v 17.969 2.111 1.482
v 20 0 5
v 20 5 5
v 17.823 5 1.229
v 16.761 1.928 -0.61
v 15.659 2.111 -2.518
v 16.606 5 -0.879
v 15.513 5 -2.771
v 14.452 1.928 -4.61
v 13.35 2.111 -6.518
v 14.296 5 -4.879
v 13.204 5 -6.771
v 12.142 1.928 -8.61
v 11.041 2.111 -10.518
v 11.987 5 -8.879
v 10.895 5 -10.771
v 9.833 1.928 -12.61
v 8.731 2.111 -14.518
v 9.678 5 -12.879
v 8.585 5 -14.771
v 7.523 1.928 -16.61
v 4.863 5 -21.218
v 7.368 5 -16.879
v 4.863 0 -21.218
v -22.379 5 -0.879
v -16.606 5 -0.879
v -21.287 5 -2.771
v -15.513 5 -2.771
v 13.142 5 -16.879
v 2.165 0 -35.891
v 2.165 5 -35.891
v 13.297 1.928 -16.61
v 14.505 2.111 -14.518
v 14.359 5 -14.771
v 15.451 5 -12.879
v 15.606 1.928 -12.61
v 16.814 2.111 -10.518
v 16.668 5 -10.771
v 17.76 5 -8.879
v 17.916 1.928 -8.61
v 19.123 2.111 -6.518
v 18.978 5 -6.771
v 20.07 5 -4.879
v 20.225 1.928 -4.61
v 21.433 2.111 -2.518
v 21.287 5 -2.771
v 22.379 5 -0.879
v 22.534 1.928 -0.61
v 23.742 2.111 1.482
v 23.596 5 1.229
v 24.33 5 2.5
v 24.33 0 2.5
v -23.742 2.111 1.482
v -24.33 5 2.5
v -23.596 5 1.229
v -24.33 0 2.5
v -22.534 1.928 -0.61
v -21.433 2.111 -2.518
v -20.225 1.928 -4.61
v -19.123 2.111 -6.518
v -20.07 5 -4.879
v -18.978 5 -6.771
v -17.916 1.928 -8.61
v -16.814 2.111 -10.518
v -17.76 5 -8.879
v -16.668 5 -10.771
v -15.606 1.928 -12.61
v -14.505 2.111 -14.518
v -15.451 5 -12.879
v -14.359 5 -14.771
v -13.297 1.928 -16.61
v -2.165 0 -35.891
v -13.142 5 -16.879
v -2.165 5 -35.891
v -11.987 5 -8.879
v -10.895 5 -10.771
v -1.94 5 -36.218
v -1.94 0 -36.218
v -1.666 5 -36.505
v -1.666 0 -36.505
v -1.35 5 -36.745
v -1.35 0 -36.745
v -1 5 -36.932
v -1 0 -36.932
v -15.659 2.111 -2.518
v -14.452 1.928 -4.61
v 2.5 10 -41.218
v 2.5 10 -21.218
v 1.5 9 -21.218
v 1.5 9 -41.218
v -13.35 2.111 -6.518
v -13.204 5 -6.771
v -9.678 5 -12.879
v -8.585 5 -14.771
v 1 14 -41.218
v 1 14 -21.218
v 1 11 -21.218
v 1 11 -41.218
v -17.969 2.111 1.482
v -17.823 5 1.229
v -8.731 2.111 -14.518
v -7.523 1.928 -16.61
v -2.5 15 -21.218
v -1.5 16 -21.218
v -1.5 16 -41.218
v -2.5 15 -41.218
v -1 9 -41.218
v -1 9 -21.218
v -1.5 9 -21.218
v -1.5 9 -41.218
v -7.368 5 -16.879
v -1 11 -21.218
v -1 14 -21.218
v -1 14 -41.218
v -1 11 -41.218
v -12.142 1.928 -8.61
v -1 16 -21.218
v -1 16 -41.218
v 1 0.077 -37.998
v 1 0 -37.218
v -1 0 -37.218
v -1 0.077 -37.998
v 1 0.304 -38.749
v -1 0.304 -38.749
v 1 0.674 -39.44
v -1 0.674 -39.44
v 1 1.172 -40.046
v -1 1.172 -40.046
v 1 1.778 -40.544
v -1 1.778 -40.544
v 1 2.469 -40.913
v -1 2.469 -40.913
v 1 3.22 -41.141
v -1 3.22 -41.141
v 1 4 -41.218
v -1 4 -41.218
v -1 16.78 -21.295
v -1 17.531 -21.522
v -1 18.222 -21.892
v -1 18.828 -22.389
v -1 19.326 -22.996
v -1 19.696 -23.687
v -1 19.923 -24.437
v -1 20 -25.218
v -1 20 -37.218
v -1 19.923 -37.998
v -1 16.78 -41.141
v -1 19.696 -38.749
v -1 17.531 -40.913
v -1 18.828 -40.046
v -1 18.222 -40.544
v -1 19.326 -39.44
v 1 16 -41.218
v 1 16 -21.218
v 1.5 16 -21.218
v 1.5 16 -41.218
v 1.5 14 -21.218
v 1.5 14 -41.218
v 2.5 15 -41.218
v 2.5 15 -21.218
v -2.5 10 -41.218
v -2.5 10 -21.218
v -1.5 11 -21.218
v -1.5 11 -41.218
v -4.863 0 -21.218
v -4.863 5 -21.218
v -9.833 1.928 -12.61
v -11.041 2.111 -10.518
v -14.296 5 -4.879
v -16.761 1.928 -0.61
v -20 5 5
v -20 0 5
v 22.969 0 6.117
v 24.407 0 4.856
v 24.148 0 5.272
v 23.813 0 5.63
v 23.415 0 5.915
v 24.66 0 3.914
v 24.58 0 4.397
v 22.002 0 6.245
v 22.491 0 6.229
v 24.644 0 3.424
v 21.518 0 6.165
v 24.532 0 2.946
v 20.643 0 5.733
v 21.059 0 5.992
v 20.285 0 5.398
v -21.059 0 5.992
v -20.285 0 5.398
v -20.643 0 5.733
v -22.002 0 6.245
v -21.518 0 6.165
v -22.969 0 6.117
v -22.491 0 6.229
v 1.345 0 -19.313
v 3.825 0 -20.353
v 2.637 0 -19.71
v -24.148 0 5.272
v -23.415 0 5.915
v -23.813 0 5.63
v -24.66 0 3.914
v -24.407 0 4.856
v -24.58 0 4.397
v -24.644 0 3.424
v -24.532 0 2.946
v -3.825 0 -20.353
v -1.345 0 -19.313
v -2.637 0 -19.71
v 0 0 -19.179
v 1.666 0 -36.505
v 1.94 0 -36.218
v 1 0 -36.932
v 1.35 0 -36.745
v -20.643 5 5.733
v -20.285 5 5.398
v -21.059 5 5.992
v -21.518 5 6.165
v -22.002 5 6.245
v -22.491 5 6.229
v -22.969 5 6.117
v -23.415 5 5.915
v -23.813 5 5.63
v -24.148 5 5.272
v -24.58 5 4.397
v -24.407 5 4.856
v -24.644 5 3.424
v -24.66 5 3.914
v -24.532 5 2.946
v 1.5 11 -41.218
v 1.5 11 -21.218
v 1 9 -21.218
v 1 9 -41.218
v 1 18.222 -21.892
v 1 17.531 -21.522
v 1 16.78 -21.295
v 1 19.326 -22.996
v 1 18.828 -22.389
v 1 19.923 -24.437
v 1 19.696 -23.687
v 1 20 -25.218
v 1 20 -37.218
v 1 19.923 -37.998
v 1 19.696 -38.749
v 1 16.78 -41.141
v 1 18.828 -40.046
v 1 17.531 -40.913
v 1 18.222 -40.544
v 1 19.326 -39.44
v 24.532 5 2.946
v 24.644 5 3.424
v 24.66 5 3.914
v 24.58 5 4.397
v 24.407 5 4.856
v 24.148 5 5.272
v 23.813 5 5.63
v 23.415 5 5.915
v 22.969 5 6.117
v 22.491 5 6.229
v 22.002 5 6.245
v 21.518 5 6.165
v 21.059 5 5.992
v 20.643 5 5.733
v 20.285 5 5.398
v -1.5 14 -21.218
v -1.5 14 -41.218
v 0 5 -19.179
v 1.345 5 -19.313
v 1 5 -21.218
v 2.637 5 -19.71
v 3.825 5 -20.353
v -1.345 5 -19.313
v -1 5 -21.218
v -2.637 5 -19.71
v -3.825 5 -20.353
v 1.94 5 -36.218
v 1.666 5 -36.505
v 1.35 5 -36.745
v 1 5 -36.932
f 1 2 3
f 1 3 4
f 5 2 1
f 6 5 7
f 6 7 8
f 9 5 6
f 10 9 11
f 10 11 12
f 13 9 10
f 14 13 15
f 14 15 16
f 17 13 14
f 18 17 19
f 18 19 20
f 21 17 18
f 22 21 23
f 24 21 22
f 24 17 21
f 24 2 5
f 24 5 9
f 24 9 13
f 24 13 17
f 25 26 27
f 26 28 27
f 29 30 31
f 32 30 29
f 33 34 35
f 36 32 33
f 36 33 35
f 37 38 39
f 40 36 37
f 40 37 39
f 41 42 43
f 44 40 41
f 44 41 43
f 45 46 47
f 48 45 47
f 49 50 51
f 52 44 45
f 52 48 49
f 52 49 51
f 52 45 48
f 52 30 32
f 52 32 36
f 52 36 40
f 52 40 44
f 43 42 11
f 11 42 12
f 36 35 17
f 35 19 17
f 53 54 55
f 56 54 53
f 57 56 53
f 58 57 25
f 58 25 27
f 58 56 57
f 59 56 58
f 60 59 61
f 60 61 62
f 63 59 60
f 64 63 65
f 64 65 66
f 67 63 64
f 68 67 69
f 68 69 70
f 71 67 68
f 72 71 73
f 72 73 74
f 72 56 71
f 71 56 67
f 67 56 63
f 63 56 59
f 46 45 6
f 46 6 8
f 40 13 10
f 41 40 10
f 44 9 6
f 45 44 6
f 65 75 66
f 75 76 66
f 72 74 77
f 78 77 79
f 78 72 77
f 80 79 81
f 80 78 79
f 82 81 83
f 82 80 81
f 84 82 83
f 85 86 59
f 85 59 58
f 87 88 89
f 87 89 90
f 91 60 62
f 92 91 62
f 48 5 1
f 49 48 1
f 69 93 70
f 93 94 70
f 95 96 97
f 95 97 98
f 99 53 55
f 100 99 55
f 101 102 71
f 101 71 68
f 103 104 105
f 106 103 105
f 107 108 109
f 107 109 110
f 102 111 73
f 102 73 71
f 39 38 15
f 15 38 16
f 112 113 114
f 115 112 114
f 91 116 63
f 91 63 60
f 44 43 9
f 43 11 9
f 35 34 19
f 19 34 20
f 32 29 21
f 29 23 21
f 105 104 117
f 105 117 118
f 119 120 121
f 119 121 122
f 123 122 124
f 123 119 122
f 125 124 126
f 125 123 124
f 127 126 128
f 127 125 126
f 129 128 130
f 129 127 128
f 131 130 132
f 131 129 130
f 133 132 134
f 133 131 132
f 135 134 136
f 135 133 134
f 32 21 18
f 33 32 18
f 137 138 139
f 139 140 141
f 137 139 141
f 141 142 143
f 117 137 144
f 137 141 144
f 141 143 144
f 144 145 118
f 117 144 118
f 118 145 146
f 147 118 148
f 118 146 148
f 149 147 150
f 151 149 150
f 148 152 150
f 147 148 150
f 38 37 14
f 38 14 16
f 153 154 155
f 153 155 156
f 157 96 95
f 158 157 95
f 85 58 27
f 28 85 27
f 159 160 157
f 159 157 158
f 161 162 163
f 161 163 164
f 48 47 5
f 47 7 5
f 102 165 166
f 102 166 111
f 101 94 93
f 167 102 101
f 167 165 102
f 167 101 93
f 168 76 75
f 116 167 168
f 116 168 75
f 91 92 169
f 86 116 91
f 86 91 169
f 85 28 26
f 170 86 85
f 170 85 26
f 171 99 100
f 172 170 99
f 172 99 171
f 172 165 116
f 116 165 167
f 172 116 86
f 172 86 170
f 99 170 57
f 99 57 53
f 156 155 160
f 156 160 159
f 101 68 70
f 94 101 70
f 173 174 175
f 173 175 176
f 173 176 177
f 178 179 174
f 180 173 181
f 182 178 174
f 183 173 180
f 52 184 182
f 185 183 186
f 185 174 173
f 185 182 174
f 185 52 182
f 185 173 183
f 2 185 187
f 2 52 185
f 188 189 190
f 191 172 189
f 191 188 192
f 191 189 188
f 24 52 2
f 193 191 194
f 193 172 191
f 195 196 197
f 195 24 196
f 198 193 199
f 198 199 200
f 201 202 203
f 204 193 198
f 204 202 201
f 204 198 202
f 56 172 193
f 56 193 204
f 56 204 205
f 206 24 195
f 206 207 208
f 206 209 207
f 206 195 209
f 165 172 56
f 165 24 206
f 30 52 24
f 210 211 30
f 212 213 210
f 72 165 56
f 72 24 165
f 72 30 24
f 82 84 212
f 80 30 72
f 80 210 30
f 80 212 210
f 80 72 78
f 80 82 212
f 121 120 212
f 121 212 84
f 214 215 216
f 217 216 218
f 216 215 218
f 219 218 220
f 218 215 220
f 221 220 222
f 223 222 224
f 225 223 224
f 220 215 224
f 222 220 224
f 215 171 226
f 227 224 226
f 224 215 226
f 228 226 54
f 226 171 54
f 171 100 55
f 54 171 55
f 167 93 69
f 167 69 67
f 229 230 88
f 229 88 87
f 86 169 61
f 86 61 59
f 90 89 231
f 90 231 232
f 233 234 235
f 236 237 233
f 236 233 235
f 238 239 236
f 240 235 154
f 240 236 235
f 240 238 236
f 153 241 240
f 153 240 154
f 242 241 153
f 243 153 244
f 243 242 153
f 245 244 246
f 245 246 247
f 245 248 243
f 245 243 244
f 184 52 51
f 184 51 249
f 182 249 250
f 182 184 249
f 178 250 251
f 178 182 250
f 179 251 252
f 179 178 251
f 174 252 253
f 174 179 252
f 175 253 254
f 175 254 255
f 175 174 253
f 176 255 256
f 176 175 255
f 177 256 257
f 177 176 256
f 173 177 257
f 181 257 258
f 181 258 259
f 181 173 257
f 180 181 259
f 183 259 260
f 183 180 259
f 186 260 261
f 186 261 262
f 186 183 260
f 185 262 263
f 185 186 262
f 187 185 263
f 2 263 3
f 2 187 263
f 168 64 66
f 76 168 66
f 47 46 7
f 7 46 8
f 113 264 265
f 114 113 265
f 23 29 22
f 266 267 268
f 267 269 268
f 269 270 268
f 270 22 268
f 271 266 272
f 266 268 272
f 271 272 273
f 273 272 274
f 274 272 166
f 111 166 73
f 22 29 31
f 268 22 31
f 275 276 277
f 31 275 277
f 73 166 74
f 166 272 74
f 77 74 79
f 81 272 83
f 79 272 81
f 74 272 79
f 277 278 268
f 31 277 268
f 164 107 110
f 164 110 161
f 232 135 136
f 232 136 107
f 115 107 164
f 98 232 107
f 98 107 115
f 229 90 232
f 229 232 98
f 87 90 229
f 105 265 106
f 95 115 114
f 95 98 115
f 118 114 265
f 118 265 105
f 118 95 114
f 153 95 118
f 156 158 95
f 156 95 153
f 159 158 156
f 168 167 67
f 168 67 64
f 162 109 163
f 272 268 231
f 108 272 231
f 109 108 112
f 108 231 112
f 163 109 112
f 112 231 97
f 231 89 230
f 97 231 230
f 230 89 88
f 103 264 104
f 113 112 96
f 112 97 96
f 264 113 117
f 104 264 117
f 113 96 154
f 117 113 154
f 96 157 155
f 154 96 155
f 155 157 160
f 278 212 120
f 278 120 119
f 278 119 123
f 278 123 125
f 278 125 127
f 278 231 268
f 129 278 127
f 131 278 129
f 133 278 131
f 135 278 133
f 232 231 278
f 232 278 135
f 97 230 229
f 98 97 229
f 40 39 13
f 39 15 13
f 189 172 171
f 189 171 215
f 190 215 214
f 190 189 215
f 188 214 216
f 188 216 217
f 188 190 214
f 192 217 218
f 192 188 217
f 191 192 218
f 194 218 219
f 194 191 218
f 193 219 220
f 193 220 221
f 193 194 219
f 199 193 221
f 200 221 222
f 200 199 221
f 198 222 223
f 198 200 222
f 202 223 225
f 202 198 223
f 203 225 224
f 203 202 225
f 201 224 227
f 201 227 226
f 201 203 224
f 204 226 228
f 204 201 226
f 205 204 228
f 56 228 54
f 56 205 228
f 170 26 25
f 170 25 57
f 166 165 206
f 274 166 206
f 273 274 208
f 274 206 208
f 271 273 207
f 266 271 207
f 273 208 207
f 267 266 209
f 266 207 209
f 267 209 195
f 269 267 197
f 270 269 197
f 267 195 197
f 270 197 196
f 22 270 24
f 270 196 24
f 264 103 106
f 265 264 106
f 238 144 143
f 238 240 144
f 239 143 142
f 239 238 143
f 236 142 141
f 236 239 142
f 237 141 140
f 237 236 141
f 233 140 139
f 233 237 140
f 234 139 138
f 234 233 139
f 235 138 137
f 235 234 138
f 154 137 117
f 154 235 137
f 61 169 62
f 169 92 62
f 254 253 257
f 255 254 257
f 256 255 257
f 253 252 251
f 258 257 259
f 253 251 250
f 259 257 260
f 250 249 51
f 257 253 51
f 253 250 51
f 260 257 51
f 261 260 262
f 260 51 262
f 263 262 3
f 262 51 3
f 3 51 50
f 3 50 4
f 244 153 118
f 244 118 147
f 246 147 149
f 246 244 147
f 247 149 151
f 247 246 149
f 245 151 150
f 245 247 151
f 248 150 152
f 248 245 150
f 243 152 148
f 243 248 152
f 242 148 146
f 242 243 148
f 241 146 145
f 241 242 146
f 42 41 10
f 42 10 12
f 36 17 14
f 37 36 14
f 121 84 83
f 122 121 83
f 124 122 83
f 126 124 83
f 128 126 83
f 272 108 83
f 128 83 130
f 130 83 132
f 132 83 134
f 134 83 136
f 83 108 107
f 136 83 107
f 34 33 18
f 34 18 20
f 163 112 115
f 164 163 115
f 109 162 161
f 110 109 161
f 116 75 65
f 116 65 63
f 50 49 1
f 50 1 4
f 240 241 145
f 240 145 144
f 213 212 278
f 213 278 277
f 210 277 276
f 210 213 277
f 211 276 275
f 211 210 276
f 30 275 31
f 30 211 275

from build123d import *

# Parameters (mm, degrees)
BASE_DEPTH           = 5
BOARDSLOT_DEPTH      = 45.86446744
BOARDSLOT_DEPTH_BACK = 45.86446744
SUPPORTMOUNT_DEPTH   = 5
BOSS_EXTRUDE1_DEPTH  = 1
SKETCH10_W           = 20
SKETCH10_H           = 2
BOSS_EXTRUDE2_DEPTH  = 2.5
CHAMFER1_SIZE        = 1


with BuildPart() as part:
    # Sketch1 → Base (new body)
    with BuildSketch(Plane(origin=(0, 0, 0), x_dir=(1, 0, 0), z_dir=(0, 1, 0))):
        with BuildLine():
            Line((-24.330127019, -2.5), (-2.165063509, 35.891016151))
            ThreePointArc((-2.165063509, 35.891016151), (0, 37.141016151), (2.165063509, 35.891016151))
            Line((2.165063509, 35.891016151), (24.330127019, -2.5))
            ThreePointArc((24.330127019, -2.5), (23.415063509, -5.915063509), (20, -5))
            Line((20, -5), (2.165063509, 25.891016151))
            ThreePointArc((2.165063509, 25.891016151), (0, 27.141016151), (-2.165063509, 25.891016151))
            Line((-2.165063509, 25.891016151), (-20, -5))
            ThreePointArc((-20, -5), (-23.415063509, -5.915063509), (-24.330127019, -2.5))
        make_face()
    extrude(amount=BASE_DEPTH)

    # Sketch2 → BoardSlot (cut, two sides: drawn at the far end of the back side and taken through both)
    with BuildSketch(Plane(origin=(0, 0, 0), x_dir=(0, 0, -1), z_dir=(1, 0, 0)).offset(-BOARDSLOT_DEPTH_BACK)):
        Polygon((-1.481783147, 2.110540039), (-0.610225719, 12.07248702), (1.481783147, 11.889459961), (0.610225719, 1.92751298), align=None)
        Polygon((3.389774281, 12.07248702), (5.481783147, 11.889459961), (4.610225719, 1.92751298), (2.518216853, 2.110540039), align=None)
        Polygon((7.389774281, 12.07248702), (9.481783147, 11.889459961), (8.610225719, 1.92751298), (6.518216853, 2.110540039), align=None)
        Polygon((11.389774281, 12.07248702), (13.481783147, 11.889459961), (12.610225719, 1.92751298), (10.518216853, 2.110540039), align=None)
        Polygon((15.389774281, 12.07248702), (17.481783147, 11.889459961), (16.610225719, 1.92751298), (14.518216853, 2.110540039), align=None)
    extrude(amount=BOARDSLOT_DEPTH + BOARDSLOT_DEPTH_BACK, mode=Mode.SUBTRACT)

    # Sketch3 → SupportMount (add)
    with BuildSketch(Plane(origin=(0, 0, 0), x_dir=(1, 0, 0), z_dir=(0, 1, 0))):
        with BuildLine():
            Line((5.906733437, 29.410253733), (2.165063509, 35.891016151))
            ThreePointArc((2.165063509, 35.891016151), (0, 37.141016151), (-2.165063509, 35.891016151))
            Line((-2.165063509, 35.891016151), (-5.906733437, 29.410253733))
            ThreePointArc((-5.906733437, 29.410253733), (0, 19.179491924), (5.906733437, 29.410253733))
        make_face()
    extrude(amount=SUPPORTMOUNT_DEPTH)

    # Sketch9 → Boss-Extrude1 (add, symmetric)
    with BuildSketch(Plane(origin=(0, 0, 0), x_dir=(0, 0, -1), z_dir=(1, 0, 0))):
        with BuildLine():
            Line((21.217819535, 0), (37.217819535, 0))
            ThreePointArc((37.217819535, 0), (40.04624666, 1.171572875), (41.217819535, 4))
            Line((41.217819535, 4), (41.217819535, 16))
            ThreePointArc((41.217819535, 16), (40.04624666, 18.828427125), (37.217819535, 20))
            Line((37.217819535, 20), (25.217819535, 20))
            ThreePointArc((25.217819535, 20), (22.38939241, 18.828427125), (21.217819535, 16))
            Line((21.217819535, 16), (21.217819535, 0))
        make_face()
    extrude(amount=BOSS_EXTRUDE1_DEPTH, both=True)

    # Sketch10 → Boss-Extrude2 (add, symmetric)
    with BuildSketch(Plane(origin=(0, 0, 0), x_dir=(0, 0, -1), z_dir=(1, 0, 0))):
        with Locations((31.217819535, 15)):
            Rectangle(SKETCH10_W, SKETCH10_H)
        with Locations((31.217819535, 10)):
            Rectangle(SKETCH10_W, SKETCH10_H)
    extrude(amount=BOSS_EXTRUDE2_DEPTH, both=True)

    # Chamfer1
    chamfer1_edges = [part.edges().sort_by_distance(p)[0] for p in [
        (-2.5, 9, -31.217819535),
        (-2.5, 11, -31.217819535),
        (-2.5, 14, -31.217819535),
        (-2.5, 16, -31.217819535),
        (2.5, 9, -31.217819535),
        (2.5, 11, -31.217819535),
        (2.5, 14, -31.217819535),
        (2.5, 16, -31.217819535),
    ]]
    chamfer(chamfer1_edges, length=CHAMFER1_SIZE - 0.0001)  # a hair under: the kernel refuses the full size


solid = part.part
